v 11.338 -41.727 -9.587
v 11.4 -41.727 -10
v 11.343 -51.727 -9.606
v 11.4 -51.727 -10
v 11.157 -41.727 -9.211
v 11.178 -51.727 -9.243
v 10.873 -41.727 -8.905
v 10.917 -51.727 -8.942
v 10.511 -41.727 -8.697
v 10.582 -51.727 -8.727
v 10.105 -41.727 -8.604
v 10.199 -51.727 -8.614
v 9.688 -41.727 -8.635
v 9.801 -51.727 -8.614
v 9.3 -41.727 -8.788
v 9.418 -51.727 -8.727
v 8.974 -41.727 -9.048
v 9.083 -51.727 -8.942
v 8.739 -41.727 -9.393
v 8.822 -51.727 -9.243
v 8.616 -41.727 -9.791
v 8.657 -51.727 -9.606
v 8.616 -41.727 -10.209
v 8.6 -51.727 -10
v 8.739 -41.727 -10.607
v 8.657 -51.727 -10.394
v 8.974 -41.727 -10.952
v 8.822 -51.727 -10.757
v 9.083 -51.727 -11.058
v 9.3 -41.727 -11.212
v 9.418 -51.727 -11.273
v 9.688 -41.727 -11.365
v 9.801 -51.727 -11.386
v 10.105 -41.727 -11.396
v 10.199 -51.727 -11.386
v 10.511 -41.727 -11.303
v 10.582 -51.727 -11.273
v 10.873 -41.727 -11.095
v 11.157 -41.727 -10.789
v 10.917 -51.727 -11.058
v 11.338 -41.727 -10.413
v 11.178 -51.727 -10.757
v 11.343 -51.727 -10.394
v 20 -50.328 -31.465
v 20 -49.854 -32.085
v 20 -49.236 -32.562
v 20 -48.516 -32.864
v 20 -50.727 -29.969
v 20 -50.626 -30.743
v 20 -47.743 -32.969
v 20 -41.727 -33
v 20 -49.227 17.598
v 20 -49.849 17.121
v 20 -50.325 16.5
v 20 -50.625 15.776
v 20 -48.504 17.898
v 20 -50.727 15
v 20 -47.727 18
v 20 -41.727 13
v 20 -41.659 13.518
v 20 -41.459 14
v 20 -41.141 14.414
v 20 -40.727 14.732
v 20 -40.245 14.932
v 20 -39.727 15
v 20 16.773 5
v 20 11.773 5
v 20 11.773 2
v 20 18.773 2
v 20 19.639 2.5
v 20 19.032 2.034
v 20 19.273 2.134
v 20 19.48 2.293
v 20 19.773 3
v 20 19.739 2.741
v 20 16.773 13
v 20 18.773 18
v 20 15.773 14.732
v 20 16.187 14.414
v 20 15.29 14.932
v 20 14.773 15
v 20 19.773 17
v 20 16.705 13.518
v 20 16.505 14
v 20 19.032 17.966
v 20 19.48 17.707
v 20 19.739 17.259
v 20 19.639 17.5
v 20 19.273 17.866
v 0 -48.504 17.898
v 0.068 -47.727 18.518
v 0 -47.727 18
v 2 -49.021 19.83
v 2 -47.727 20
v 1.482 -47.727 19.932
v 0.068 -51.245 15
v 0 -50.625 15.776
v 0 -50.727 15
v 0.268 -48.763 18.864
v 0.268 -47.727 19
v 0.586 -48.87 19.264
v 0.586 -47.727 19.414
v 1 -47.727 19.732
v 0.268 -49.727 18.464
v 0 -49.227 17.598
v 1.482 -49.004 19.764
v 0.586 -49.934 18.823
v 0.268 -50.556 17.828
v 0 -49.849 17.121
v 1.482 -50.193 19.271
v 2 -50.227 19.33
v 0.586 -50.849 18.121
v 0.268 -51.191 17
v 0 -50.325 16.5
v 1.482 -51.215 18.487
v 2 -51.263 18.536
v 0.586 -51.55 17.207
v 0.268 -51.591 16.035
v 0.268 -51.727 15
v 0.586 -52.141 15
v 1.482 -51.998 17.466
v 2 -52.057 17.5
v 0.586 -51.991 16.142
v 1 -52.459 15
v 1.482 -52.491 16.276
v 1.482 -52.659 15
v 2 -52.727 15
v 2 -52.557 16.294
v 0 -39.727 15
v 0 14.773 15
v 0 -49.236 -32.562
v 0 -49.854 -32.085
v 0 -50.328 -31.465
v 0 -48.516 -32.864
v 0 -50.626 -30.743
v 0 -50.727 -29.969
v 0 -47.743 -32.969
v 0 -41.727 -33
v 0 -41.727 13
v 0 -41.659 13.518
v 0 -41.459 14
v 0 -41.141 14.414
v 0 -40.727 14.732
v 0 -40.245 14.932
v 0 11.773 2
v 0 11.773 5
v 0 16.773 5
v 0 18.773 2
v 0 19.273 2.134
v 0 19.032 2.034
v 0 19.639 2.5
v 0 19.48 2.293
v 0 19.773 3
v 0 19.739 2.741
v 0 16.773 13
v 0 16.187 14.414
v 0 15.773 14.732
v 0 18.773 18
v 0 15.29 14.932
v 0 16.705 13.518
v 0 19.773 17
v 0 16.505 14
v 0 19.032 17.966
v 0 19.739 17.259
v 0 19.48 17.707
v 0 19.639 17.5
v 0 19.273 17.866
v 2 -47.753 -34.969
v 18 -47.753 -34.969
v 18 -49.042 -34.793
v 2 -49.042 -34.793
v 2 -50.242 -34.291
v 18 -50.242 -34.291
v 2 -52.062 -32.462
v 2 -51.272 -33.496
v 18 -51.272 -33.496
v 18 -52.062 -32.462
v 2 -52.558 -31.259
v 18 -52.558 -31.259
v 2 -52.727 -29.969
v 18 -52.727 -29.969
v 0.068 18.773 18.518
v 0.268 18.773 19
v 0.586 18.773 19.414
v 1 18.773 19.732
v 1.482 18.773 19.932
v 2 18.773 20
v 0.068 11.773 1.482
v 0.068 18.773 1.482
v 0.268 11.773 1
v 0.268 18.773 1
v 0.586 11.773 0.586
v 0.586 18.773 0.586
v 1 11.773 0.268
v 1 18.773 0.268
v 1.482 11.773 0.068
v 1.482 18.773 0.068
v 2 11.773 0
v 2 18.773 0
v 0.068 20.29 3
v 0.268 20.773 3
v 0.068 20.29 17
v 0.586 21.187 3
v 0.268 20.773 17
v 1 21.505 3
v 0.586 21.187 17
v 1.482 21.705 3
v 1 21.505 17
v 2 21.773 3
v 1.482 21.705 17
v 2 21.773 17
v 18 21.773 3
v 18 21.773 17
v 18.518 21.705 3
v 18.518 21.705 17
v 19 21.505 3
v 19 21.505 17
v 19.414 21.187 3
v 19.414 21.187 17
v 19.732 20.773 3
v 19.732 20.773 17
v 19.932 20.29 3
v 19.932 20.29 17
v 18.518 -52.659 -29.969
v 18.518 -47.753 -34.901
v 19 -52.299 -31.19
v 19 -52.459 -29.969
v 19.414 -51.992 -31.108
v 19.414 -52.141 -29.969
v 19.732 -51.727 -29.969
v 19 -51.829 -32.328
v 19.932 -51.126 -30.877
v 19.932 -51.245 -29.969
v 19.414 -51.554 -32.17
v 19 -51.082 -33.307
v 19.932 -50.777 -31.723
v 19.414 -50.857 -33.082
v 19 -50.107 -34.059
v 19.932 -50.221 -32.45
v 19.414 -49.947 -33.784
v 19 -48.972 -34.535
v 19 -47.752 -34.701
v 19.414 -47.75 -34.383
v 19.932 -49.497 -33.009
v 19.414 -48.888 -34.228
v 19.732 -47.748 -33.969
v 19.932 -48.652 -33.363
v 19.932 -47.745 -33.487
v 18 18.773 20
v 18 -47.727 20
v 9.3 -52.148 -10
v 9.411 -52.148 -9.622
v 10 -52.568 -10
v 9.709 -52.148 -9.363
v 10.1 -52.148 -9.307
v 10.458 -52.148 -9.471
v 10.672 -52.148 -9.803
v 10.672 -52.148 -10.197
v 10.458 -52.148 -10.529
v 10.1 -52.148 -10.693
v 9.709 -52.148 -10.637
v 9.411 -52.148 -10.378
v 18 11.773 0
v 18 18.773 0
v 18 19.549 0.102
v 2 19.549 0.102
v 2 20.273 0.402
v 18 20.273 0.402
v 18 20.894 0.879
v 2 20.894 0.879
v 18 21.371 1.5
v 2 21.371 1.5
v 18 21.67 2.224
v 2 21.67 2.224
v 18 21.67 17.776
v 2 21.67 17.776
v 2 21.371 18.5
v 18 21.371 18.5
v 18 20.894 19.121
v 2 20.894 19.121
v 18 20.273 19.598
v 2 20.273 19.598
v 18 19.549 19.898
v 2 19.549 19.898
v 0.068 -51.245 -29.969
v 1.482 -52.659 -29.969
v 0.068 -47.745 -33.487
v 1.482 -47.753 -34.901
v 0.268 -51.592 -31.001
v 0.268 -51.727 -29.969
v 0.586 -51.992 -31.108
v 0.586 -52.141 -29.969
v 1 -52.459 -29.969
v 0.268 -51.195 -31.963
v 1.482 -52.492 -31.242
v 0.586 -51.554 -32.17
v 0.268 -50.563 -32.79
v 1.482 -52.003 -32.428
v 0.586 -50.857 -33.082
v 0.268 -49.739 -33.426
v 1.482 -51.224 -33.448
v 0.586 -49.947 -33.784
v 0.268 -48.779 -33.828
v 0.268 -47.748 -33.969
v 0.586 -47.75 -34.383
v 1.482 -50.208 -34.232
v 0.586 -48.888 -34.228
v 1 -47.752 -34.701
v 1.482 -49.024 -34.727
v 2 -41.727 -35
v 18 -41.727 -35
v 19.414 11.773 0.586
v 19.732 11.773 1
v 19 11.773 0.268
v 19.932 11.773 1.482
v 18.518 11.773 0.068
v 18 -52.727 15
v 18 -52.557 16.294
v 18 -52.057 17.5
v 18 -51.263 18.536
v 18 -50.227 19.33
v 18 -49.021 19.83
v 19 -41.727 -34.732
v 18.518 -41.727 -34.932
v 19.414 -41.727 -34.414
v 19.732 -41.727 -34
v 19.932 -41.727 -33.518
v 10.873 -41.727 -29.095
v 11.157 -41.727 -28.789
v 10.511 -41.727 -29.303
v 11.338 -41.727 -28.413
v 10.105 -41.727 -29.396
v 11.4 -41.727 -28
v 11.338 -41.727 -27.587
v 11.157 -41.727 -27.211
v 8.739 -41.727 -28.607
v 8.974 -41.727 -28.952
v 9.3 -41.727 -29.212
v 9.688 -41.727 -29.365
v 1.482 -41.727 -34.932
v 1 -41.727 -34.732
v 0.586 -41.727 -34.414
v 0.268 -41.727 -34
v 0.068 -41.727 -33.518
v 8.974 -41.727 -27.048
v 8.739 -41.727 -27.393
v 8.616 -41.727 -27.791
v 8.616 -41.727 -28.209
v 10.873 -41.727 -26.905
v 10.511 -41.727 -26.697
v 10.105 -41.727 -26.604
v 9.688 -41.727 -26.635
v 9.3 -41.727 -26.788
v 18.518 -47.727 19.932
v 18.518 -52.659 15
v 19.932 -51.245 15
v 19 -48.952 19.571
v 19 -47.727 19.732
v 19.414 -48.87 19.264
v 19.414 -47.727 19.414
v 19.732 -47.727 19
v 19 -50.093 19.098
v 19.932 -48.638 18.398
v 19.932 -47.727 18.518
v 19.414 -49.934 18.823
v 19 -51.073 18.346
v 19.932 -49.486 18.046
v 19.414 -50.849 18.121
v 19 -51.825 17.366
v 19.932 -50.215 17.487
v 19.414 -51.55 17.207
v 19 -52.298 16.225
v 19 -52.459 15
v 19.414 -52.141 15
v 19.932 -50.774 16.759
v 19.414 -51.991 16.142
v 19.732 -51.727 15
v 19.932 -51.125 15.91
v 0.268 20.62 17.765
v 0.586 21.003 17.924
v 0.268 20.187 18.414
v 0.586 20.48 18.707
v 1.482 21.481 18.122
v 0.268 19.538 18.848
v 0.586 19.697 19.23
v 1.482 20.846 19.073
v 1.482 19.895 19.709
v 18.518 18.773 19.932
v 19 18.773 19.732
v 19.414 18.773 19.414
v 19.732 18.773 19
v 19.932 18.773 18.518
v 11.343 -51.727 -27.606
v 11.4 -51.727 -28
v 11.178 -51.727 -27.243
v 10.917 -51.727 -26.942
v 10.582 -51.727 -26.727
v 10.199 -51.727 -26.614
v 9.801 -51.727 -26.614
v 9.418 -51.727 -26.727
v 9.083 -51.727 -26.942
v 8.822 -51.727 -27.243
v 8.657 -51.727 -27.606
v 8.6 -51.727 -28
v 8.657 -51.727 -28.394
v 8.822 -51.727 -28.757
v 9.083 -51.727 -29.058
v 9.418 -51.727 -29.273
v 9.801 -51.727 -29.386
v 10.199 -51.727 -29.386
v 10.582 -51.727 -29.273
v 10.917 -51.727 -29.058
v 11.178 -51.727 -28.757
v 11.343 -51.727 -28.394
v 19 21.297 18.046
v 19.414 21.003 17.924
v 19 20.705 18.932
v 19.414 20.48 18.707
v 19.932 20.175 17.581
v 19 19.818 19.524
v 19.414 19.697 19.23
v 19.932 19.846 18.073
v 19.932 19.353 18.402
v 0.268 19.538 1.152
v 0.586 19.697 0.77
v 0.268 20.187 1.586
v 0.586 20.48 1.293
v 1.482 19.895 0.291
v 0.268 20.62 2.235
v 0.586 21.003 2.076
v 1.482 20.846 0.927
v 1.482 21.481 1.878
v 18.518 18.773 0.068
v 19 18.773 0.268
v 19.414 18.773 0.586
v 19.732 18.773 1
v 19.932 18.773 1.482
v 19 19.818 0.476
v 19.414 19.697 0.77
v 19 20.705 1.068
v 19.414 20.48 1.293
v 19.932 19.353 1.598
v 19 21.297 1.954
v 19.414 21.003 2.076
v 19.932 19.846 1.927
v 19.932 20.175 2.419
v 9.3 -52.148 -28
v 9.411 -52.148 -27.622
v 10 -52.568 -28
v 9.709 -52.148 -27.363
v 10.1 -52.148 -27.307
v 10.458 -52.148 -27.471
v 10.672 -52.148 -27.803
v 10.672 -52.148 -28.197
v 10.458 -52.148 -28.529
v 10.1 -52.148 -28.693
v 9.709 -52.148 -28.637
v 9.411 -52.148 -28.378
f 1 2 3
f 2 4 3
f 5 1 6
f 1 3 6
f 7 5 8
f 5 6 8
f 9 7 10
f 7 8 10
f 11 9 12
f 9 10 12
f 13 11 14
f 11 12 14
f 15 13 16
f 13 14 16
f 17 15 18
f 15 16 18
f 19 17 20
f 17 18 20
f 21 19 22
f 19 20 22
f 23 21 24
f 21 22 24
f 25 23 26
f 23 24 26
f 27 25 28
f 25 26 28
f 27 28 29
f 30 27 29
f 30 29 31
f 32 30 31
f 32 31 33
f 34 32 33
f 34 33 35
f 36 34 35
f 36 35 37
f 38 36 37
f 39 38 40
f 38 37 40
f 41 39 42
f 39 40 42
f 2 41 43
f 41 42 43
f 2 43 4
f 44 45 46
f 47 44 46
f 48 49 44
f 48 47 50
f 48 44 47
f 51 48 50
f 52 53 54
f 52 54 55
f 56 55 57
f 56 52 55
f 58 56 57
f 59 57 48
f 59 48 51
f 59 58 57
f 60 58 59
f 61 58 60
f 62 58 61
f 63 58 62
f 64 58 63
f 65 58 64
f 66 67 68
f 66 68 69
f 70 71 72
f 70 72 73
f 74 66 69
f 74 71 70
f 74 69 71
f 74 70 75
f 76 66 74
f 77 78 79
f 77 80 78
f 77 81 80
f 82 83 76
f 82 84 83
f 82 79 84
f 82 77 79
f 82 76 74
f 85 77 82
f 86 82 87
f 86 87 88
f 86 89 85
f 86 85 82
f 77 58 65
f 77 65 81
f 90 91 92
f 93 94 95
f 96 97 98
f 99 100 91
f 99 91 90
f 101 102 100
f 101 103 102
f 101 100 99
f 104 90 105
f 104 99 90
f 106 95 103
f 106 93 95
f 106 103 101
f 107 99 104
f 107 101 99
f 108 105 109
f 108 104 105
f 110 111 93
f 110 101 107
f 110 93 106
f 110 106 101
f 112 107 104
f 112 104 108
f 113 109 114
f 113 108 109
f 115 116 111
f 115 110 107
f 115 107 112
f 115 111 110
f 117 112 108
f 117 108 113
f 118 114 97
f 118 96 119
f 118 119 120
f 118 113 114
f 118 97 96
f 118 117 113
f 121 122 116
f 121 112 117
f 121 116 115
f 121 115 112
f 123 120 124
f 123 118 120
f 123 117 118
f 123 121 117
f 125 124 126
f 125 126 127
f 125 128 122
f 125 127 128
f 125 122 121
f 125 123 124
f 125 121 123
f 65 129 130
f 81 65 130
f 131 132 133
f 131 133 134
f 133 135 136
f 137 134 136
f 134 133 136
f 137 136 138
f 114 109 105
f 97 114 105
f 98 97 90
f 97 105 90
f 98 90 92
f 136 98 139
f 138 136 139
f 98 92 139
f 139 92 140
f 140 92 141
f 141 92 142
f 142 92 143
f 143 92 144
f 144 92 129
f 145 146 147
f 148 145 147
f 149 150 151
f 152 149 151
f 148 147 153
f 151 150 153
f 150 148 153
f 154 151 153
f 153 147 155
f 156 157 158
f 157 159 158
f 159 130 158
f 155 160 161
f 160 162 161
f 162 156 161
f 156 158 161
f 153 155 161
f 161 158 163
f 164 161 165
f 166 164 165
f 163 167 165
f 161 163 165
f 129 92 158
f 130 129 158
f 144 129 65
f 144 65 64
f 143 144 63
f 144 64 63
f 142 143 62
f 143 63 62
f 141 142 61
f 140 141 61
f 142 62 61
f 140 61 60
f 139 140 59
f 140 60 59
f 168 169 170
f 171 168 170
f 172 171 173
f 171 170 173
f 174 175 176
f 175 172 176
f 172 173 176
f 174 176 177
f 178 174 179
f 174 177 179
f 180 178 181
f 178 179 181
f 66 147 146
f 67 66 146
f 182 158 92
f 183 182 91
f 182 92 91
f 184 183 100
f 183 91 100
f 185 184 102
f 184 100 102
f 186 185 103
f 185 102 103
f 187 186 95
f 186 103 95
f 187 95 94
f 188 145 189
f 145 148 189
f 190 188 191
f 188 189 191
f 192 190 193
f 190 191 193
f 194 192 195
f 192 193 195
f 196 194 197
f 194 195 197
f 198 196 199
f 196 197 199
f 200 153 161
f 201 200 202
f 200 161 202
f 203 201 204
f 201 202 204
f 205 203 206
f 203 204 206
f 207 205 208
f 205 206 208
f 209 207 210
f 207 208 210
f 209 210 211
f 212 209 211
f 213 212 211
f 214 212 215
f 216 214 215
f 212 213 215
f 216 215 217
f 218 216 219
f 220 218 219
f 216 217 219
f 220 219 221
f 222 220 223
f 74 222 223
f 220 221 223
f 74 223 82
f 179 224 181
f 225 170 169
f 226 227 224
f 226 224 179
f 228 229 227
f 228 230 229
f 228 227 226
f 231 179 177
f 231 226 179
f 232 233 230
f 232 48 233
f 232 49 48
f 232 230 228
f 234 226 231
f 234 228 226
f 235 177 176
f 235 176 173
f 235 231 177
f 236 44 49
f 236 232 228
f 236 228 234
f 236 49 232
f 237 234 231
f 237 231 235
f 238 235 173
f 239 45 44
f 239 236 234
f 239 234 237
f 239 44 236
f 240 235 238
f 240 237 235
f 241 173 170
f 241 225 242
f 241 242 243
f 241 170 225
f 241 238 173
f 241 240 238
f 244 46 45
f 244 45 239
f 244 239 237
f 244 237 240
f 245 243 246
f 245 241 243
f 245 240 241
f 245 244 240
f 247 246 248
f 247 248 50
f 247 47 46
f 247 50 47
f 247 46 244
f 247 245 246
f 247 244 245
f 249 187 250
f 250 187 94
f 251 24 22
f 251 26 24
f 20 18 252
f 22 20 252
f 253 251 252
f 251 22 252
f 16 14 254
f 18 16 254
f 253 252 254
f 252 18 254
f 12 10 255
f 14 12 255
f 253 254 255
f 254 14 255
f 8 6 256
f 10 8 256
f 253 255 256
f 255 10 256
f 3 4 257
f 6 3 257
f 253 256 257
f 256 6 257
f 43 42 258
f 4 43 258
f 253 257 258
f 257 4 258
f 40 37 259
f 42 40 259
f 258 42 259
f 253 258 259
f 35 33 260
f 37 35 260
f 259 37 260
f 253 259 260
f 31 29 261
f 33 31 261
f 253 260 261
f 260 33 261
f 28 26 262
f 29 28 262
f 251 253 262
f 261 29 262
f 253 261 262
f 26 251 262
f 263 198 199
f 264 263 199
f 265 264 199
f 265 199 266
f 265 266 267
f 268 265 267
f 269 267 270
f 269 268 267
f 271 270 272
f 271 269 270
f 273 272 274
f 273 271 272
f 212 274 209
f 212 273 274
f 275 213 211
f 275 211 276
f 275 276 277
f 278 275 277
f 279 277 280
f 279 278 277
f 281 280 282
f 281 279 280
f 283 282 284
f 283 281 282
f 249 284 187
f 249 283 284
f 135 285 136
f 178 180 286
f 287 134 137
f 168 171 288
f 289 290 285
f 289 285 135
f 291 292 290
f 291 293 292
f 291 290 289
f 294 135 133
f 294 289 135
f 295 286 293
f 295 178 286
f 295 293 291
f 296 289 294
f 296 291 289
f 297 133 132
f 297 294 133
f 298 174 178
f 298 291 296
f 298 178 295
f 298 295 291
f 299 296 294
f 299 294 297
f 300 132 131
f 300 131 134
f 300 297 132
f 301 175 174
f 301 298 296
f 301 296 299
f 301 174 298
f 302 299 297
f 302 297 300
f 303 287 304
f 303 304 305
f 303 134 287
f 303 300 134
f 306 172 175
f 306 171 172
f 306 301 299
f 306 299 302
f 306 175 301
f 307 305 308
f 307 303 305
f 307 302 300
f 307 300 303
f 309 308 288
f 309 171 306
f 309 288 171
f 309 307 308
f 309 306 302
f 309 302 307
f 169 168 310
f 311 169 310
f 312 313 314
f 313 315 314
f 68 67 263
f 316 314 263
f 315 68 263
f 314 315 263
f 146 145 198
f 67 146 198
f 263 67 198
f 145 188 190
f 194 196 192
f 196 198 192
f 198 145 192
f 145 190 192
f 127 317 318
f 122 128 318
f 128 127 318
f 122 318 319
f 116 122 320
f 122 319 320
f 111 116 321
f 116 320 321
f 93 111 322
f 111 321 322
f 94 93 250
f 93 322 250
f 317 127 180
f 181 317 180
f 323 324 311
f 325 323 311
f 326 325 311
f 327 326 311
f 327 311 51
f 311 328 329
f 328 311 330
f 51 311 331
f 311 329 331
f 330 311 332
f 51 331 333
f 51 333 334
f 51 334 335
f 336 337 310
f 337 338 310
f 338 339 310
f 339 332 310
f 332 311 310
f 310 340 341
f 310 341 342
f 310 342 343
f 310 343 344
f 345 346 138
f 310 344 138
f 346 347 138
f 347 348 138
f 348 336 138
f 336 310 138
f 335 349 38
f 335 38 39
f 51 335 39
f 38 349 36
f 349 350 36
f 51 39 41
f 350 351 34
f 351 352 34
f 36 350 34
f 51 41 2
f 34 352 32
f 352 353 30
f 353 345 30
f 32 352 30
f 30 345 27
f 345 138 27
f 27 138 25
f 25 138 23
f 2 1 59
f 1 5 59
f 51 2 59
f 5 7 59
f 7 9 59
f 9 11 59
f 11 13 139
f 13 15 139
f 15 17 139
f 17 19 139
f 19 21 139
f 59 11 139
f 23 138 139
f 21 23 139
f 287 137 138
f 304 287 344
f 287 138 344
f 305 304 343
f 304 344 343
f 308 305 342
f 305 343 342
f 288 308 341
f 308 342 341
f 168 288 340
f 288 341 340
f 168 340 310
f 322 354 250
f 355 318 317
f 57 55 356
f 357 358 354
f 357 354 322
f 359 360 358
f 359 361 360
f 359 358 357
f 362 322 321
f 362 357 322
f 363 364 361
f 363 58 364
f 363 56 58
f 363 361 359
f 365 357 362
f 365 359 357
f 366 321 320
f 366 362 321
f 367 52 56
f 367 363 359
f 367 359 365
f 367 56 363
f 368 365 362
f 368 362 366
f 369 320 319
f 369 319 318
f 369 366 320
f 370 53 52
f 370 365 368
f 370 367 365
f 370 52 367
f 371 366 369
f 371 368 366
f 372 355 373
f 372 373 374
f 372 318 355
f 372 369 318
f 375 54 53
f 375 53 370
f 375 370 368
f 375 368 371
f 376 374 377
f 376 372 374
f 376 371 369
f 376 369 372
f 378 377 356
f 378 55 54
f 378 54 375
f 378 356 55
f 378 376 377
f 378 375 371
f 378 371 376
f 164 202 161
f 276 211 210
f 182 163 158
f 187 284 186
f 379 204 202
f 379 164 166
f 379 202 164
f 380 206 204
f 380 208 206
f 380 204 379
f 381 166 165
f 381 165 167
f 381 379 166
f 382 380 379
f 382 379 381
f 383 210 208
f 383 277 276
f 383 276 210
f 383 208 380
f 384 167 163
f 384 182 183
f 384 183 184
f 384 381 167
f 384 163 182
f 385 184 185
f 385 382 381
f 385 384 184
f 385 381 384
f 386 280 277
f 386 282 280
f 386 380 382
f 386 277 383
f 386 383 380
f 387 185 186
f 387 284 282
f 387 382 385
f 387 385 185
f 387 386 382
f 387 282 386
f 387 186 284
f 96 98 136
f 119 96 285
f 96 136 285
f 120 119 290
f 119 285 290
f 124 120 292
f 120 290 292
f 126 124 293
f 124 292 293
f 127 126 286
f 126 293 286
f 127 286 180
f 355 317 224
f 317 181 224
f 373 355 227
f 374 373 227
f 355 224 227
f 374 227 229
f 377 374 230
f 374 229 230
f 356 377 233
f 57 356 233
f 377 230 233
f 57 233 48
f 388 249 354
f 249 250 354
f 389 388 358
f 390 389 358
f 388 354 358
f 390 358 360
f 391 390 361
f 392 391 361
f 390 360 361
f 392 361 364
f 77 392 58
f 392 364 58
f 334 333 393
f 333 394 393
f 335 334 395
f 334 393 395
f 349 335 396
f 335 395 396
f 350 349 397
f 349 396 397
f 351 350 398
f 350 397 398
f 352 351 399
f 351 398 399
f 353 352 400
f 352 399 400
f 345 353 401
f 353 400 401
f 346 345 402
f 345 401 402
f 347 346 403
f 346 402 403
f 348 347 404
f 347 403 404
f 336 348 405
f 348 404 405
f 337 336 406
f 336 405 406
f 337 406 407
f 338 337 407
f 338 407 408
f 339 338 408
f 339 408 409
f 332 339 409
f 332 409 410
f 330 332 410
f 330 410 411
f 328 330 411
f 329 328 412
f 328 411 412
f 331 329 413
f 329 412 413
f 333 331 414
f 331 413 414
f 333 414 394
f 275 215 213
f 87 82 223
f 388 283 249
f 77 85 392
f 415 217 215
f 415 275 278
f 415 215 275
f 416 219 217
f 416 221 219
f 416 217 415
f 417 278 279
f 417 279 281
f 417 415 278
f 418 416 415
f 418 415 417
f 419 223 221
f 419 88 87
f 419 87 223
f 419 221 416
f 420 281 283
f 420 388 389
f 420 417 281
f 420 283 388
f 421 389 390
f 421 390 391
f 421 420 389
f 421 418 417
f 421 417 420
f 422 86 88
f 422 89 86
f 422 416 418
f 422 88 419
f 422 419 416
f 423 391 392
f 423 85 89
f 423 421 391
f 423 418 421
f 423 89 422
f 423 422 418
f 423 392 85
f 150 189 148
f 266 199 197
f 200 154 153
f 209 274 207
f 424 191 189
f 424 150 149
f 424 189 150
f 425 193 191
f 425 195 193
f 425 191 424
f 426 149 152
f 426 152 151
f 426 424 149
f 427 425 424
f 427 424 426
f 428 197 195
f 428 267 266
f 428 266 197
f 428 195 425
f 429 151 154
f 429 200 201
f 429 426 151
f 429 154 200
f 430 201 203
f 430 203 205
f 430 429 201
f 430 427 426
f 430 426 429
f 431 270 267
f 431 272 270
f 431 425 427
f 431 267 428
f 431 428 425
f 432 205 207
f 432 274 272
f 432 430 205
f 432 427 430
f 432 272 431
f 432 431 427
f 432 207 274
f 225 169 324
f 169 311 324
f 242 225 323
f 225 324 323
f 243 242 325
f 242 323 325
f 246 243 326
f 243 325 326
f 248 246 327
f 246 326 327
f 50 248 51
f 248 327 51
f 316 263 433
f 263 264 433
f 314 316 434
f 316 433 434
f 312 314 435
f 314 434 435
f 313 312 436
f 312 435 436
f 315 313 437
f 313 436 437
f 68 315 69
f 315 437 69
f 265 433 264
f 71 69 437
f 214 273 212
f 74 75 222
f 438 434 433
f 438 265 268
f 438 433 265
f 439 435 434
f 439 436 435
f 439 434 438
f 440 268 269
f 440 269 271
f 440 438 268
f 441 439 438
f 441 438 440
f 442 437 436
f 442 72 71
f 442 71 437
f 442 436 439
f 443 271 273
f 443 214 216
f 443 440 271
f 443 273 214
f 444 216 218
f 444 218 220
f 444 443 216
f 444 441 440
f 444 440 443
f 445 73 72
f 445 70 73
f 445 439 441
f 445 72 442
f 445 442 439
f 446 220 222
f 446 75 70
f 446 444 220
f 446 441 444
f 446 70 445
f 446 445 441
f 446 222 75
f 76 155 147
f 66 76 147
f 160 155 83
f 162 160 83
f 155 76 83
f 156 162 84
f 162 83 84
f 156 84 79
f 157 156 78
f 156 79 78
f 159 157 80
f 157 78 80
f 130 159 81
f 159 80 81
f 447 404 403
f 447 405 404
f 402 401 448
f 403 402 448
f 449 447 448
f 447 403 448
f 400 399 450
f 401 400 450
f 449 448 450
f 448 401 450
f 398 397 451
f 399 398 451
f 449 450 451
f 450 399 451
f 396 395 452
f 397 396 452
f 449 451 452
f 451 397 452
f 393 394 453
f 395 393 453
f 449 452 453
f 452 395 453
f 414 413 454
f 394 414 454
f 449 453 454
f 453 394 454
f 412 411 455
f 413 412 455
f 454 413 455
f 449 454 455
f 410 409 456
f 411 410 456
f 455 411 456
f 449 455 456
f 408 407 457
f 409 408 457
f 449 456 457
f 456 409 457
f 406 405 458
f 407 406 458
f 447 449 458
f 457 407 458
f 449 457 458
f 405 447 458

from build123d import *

# Parameters (mm, degrees)
F1_DEPTH = 20
F2_R     = 3
F3_R     = 2
F4_R     = 5
F6_D     = 2.8
F6_DEPTH = 10
F6_TIP   = 0.8412048666
F7_R     = 2


with BuildPart() as f1:
    # F0 (on Right) → F1 (new body)
    with BuildSketch(Plane.YZ):
        Polygon((11.7727210118, 5), (11.7727210118, 0), (21.7727210118, 0), (21.7727210118, 20), (-52.7272789882, 20), (-52.7272789882, -34.9435843527), (-41.7272789882, -35), (-41.7272789882, 15), (16.7727210118, 15), (16.7727210118, 5), align=None)
    extrude(amount=F1_DEPTH)

    # F2
    f2_edges = [f1.edges().sort_by_distance(p)[0] for p in [
        (10, 21.772721, 20),
        (10, 21.772721, 0),
    ]]
    fillet(f2_edges, radius=F2_R)

    # F3
    f3_edges = [f1.edges().sort_by_distance(p)[0] for p in [
        (10, -41.727279, 15),
        (10, 16.772721, 15),
    ]]
    fillet(f3_edges, radius=F3_R)

    # F4
    f4_edges = [f1.edges().sort_by_distance(p)[0] for p in [
        (10, -52.727279, -34.943584),
        (10, -52.727279, 20),
    ]]
    fillet(f4_edges, radius=F4_R)

    # F6
    with Locations(Plane(origin=(0, -41.7272789882, 0), x_dir=(-1, 0, 0), z_dir=(0, 1, 0))):
        with Locations((-10, -28), (-10, -10)):
            Hole(F6_D / 2, depth=F6_DEPTH)
            with Locations((0, 0, -(F6_DEPTH + F6_TIP / 2))):  # 118° drill point
                Cone(0, F6_D / 2, F6_TIP, mode=Mode.SUBTRACT)

    # F7
    f7_edges = [f1.edges().sort_by_distance(p)[0] for p in [
        (0, -52.727279, -7.484581),
        (20, -14.477279, 20),
    ]]
    fillet(f7_edges, radius=F7_R)


solid = f1.part
